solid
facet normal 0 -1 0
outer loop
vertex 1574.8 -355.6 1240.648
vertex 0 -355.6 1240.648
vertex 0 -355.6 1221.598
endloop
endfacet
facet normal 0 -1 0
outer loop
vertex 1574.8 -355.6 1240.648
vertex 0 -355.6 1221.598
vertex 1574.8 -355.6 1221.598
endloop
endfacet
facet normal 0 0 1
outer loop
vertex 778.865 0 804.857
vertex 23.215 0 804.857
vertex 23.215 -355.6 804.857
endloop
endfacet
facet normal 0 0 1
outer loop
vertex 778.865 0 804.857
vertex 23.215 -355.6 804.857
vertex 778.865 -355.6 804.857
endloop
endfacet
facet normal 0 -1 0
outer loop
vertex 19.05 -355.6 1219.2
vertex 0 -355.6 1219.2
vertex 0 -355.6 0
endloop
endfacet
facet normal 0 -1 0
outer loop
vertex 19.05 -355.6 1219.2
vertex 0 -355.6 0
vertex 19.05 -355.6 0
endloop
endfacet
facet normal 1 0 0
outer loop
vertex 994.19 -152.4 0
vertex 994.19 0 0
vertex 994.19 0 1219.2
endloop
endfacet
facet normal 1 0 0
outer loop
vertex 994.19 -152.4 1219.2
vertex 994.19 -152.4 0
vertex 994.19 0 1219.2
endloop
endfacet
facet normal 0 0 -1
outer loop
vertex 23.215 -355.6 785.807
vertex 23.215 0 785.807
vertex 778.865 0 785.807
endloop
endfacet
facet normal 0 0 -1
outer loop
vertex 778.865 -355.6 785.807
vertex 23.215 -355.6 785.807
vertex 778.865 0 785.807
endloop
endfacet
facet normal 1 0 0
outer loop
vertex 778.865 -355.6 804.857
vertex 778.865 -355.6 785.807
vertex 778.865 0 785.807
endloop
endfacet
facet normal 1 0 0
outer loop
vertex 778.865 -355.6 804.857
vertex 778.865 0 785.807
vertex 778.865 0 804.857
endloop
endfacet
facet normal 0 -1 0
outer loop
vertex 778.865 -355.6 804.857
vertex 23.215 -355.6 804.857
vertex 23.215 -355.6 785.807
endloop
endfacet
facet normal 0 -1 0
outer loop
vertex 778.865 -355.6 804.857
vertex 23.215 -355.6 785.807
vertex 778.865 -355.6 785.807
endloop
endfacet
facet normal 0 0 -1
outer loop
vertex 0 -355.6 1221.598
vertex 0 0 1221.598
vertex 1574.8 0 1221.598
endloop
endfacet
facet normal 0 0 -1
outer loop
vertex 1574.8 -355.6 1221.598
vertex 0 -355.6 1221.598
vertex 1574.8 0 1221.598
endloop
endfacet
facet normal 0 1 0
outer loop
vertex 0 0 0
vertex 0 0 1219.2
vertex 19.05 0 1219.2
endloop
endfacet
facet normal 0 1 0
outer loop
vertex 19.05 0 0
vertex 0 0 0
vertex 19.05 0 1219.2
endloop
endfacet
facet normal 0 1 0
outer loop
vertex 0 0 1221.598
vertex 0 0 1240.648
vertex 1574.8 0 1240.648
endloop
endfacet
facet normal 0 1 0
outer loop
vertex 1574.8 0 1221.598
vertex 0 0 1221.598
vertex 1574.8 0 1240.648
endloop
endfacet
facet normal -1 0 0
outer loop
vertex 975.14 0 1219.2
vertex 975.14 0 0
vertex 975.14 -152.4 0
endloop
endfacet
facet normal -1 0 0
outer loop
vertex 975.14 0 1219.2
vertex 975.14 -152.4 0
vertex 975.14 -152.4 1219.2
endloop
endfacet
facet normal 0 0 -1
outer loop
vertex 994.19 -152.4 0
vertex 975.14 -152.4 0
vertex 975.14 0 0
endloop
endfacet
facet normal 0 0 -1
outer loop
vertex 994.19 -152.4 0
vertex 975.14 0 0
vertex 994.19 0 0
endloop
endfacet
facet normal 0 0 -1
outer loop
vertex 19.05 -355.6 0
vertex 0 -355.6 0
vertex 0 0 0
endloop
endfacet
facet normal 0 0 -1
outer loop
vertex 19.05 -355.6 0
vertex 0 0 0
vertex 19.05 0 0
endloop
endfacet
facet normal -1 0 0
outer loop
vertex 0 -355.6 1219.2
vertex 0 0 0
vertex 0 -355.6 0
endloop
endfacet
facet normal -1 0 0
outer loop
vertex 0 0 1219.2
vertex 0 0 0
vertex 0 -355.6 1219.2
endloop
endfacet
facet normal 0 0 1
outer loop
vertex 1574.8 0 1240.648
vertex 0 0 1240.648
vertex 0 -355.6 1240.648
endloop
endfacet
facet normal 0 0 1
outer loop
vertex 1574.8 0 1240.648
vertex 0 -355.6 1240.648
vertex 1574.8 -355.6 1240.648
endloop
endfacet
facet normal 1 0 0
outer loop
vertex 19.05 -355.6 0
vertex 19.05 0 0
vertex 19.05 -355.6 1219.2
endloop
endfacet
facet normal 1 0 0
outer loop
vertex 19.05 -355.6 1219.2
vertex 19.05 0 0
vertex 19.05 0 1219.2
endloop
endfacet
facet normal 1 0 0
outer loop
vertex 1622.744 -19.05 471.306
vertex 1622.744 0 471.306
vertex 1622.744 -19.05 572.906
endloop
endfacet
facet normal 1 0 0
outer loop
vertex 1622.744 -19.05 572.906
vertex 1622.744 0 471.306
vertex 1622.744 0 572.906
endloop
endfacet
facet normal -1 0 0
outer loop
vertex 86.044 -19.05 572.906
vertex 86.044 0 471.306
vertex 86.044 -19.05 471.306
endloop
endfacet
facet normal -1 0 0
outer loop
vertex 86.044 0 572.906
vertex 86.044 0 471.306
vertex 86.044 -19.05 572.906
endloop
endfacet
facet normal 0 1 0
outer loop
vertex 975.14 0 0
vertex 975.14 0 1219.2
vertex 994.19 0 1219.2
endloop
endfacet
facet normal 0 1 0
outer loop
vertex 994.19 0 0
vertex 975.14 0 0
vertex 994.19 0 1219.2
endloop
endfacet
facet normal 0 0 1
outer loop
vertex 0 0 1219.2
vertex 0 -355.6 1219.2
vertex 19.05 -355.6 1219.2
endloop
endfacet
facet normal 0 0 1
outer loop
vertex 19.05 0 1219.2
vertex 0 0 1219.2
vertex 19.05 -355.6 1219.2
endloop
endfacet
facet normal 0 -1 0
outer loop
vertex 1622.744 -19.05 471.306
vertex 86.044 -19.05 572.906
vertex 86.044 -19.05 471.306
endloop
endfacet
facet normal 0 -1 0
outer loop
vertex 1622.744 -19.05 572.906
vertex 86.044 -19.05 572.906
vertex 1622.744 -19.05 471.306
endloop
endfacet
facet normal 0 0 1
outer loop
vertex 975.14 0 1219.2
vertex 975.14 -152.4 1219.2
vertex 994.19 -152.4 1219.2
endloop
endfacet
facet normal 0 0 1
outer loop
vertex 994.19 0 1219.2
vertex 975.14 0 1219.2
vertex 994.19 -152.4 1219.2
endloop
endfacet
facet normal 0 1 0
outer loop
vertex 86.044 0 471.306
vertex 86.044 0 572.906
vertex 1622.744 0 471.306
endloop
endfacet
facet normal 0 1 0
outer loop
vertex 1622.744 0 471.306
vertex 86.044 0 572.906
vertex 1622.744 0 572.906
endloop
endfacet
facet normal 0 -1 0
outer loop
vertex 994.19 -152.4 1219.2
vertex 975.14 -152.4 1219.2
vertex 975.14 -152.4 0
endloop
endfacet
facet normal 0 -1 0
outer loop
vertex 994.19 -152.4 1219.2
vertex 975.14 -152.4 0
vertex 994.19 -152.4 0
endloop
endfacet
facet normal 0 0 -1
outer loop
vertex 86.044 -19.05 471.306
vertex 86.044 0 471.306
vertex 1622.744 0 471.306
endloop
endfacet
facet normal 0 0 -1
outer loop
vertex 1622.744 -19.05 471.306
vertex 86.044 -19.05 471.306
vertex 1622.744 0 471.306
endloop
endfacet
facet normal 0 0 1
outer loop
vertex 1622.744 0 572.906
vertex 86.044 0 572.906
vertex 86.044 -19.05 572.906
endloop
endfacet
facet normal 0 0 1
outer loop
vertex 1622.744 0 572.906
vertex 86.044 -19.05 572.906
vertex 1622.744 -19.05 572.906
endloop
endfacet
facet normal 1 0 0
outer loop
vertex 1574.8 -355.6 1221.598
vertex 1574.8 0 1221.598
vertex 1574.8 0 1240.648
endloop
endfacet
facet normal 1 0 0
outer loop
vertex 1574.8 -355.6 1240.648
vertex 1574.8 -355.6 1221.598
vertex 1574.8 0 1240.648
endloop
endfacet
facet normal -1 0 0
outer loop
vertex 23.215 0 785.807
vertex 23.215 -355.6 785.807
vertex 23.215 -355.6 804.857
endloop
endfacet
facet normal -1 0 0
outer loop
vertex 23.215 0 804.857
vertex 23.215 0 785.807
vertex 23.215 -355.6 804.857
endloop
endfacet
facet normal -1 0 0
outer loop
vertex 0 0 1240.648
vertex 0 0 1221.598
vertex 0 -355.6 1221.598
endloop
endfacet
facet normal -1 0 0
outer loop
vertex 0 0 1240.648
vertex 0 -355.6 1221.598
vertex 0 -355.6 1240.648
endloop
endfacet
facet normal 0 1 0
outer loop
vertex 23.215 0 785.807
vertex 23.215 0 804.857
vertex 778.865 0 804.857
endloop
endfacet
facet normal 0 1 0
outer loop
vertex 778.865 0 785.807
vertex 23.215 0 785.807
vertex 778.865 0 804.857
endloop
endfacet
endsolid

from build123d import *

# Parameters (mm, degrees)
F0_W     = 19.05
F0_H     = 1219.2
F1_DEPTH = 355.6
F2_W     = 1574.8
F2_H     = 19.05
F3_DEPTH = 355.6
F4_W     = 755.65
F4_H     = 19.05
F5_DEPTH = 355.6
F6_W     = 1536.7
F6_H     = 101.6
F7_DEPTH = 19.05
F8_W     = 19.05
F8_H     = 1219.2
F9_DEPTH = 152.4


with BuildPart() as f1:
    # F0 (on Front) → F1 (new body)
    with BuildSketch(Plane.XZ):
        with Locations((9.525, 609.6)):
            Rectangle(F0_W, F0_H)
    extrude(amount=F1_DEPTH)


with BuildPart() as f3:
    # F2 (on Front) → F3 (new body)
    with BuildSketch(Plane.XZ):
        with Locations((787.4, 1231.123268)):
            Rectangle(F2_W, F2_H)
    extrude(amount=F3_DEPTH)


with BuildPart() as f5:
    # F4 (on Front) → F5 (new body)
    with BuildSketch(Plane.XZ):
        with Locations((401.039836, 795.332371)):
            Rectangle(F4_W, F4_H)
    extrude(amount=F5_DEPTH)


with BuildPart() as f7:
    # F6 (on Front) → F7 (new body)
    with BuildSketch(Plane.XZ):
        with Locations((854.394039, 522.106338)):
            Rectangle(F6_W, F6_H)
    extrude(amount=F7_DEPTH)


with BuildPart() as f9:
    # F8 (on Front) → F9 (new body)
    with BuildSketch(Plane.XZ):
        with Locations((984.664558, 609.6)):
            Rectangle(F8_W, F8_H)
    extrude(amount=F9_DEPTH)


solid = Compound([f1.part, f3.part, f5.part, f7.part, f9.part])
